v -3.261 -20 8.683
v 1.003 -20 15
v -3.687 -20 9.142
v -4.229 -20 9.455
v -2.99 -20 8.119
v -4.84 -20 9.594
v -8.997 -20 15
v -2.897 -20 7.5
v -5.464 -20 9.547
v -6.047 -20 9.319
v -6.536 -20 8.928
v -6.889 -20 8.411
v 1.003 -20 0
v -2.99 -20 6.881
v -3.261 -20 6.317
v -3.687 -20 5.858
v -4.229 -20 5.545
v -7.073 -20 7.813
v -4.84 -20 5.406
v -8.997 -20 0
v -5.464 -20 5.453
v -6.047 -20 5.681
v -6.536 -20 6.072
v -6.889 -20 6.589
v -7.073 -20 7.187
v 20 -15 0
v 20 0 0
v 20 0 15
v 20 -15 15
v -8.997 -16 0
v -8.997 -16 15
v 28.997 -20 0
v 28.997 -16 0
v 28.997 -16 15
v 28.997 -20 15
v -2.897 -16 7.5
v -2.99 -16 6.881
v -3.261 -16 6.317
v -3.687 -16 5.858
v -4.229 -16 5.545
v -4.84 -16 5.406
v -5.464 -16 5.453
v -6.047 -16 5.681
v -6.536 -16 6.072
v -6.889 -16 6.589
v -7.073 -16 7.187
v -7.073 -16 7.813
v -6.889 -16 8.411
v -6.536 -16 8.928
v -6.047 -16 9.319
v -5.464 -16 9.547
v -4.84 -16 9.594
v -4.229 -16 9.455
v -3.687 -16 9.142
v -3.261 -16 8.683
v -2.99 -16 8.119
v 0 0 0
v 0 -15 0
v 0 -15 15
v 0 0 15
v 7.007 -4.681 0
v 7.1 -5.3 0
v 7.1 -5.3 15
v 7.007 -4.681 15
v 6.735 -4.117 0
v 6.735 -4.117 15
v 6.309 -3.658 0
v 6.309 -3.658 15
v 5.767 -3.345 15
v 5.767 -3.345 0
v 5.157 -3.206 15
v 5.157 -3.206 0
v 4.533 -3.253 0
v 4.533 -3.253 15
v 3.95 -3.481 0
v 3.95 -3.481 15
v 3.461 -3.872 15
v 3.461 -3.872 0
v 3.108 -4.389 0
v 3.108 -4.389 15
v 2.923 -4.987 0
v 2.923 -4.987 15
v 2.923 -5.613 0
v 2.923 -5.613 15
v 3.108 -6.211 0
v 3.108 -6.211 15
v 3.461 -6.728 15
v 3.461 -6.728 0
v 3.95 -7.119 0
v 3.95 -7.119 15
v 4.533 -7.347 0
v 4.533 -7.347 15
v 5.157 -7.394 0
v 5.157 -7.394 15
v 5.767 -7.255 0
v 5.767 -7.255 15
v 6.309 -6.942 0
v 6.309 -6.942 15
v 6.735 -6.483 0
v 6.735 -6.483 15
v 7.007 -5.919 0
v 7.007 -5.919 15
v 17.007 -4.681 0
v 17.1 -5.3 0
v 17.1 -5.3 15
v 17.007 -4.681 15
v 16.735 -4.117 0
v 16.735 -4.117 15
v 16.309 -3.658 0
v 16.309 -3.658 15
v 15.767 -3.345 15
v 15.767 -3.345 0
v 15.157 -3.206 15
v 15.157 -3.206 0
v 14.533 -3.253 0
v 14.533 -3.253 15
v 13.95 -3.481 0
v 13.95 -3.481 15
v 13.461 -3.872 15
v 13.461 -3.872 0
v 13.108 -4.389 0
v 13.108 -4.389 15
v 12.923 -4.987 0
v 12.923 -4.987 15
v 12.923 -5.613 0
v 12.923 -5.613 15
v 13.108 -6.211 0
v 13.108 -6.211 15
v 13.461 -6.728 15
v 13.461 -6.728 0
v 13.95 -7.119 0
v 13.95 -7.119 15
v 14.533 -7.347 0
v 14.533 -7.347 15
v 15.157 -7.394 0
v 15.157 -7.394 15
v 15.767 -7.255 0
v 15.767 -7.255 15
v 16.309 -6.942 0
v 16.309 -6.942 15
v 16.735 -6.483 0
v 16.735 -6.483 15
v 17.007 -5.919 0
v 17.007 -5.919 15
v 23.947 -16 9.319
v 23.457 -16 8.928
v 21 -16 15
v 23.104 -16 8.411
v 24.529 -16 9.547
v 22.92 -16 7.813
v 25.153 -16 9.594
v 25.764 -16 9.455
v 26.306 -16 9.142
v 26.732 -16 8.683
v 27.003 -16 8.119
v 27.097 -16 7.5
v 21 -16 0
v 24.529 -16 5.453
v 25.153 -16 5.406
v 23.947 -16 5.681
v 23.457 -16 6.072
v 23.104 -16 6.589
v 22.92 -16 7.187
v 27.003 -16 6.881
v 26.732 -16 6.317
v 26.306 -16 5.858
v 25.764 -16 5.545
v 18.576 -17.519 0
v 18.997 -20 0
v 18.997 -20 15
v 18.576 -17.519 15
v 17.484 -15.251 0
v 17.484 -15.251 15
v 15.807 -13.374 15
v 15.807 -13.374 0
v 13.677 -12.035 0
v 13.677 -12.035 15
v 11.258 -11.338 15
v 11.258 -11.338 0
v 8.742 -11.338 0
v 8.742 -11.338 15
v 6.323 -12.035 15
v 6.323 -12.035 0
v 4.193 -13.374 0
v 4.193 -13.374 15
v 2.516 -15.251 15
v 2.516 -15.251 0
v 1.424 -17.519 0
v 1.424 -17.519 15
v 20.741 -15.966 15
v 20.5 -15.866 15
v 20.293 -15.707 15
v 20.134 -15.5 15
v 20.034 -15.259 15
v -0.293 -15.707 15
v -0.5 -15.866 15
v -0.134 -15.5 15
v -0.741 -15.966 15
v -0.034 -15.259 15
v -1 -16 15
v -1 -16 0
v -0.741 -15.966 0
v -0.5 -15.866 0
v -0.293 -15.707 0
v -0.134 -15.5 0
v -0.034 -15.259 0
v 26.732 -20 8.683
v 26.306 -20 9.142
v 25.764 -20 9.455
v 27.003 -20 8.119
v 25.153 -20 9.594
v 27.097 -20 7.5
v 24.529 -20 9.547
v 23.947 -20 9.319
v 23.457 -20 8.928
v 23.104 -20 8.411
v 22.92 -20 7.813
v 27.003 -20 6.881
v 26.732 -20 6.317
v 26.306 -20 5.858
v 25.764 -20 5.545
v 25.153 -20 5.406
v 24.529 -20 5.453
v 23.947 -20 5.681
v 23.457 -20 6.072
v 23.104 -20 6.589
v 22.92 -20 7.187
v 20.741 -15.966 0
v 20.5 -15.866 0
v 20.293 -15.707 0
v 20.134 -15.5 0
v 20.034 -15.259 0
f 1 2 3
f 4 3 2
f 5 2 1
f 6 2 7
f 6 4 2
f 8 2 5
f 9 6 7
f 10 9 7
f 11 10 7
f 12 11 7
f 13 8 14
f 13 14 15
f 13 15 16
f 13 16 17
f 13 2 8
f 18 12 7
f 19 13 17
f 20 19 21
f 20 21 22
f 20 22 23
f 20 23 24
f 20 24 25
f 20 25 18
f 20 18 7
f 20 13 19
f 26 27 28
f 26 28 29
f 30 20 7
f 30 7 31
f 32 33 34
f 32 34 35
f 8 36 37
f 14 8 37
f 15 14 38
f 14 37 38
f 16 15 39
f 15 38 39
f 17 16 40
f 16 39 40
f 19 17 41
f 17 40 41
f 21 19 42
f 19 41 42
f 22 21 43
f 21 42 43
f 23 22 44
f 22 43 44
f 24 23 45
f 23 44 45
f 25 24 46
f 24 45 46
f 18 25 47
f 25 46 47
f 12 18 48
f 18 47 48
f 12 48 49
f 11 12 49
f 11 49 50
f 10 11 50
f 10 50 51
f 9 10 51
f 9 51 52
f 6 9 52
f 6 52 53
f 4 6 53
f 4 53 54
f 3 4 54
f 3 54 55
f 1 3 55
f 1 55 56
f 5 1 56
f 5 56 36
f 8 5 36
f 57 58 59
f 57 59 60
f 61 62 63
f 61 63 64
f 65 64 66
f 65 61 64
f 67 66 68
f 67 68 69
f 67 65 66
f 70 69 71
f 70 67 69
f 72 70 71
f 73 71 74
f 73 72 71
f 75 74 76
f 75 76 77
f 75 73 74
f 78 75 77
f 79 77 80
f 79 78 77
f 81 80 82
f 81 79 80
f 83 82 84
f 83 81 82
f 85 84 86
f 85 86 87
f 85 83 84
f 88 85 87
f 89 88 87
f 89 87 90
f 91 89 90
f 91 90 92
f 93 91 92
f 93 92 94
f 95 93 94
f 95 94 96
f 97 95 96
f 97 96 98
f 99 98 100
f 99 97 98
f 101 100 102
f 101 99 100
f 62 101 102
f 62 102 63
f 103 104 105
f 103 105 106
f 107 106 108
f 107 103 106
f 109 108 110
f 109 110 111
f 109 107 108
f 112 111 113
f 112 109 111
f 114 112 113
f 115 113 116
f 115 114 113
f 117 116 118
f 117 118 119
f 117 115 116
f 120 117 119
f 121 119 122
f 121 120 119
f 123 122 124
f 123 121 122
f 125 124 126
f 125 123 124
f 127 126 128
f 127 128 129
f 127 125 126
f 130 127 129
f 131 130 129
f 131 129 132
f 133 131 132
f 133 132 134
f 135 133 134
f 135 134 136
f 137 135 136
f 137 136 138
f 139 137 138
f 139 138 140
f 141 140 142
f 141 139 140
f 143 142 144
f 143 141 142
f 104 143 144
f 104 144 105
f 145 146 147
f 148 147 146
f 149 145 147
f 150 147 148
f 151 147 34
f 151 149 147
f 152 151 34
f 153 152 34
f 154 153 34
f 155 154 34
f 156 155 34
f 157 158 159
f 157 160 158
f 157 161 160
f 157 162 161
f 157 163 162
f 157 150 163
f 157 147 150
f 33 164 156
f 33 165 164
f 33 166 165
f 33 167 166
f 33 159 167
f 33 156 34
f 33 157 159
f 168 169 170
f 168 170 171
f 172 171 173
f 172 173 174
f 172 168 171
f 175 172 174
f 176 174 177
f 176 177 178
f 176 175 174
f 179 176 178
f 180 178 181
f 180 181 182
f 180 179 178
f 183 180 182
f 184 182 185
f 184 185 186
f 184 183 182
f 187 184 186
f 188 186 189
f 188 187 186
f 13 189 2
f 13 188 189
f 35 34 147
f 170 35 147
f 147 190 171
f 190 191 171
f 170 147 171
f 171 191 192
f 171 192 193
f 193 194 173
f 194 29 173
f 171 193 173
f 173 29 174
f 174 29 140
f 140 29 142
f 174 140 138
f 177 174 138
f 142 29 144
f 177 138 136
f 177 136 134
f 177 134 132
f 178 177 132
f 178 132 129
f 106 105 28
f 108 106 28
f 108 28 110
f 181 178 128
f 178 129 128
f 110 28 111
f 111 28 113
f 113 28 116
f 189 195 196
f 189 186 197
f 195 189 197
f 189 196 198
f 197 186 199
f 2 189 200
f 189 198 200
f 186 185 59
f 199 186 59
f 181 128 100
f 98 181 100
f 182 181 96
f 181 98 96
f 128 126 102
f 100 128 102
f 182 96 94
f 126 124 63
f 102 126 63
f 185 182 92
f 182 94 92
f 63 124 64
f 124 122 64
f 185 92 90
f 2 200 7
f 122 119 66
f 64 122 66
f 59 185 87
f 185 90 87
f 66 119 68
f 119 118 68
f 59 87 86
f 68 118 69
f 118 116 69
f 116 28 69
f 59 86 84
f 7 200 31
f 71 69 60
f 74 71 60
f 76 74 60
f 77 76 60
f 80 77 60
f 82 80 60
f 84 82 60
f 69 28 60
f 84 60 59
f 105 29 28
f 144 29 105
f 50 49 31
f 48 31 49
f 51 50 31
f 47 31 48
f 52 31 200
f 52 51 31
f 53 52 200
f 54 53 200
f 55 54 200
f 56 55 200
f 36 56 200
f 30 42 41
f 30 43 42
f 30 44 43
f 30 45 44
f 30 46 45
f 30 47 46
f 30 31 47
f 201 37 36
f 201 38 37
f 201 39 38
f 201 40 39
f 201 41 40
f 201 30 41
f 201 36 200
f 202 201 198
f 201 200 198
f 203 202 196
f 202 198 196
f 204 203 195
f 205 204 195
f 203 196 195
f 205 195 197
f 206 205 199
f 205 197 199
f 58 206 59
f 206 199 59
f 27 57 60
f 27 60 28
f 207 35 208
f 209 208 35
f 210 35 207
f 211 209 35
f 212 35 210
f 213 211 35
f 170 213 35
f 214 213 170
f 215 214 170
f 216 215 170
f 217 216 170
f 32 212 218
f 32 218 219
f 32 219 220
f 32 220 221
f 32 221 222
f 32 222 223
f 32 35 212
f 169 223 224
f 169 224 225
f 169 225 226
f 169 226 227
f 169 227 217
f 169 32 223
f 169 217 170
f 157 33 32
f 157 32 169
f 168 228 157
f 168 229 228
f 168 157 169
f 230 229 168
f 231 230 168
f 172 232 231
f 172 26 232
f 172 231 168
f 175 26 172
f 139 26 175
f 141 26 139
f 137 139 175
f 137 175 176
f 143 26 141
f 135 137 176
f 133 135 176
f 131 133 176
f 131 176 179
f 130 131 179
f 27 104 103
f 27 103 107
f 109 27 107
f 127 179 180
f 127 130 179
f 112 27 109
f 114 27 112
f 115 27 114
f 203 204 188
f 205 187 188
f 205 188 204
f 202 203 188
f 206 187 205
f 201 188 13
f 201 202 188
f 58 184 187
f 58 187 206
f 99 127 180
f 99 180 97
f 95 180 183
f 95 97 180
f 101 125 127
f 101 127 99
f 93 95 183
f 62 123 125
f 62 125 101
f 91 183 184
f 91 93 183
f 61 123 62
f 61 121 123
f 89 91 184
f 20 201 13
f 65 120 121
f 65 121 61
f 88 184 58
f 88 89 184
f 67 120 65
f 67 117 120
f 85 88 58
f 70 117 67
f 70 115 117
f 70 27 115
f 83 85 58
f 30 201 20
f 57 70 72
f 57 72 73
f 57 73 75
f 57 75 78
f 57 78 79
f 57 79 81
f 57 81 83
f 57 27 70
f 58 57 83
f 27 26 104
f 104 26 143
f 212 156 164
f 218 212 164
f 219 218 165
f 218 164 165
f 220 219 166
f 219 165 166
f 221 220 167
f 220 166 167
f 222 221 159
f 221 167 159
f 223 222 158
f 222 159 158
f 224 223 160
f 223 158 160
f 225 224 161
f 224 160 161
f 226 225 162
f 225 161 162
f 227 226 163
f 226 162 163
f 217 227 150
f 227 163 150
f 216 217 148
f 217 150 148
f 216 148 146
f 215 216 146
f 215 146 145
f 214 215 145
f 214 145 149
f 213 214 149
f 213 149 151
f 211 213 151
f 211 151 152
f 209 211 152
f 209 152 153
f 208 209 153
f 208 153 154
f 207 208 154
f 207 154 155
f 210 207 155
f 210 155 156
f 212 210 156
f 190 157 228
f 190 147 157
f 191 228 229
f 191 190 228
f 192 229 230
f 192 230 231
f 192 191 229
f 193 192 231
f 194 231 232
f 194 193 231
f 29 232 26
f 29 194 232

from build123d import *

# Parameters (mm, degrees)
SKETCH1_R           = 2.1
BOSS_EXTRUDE1_DEPTH = 15
SKETCH2_R           = 2.1
CUT_EXTRUDE1_DEPTH  = 10
FILLET2_R           = 1


with BuildPart() as part:
    # Sketch1 → Boss-Extrude1 (new body)
    with BuildSketch(Plane.XY):
        with BuildLine():
            ThreePointArc((18.996527108, -20), (10, -11.25), (1.003472892, -20))
            Line((1.003472892, -20), (-8.996527108, -20))
            Line((-8.996527108, -20), (-8.996527108, -16))
            Line((-8.996527108, -16), (0, -16))
            Line((0, -16), (0, 0))
            Line((0, 0), (20, 0))
            Line((20, 0), (20, -16))
            Line((20, -16), (28.996527108, -16))
            Line((28.996527108, -16), (28.996527108, -20))
            Line((28.996527108, -20), (18.996527108, -20))
        make_face()
        with Locations((15, -5.3)):
            Circle(SKETCH1_R, mode=Mode.SUBTRACT)
        with Locations((5, -5.3)):
            Circle(SKETCH1_R, mode=Mode.SUBTRACT)
    extrude(amount=BOSS_EXTRUDE1_DEPTH)

    # Sketch2 → Cut-Extrude1 (cut)
    with BuildSketch(Plane(origin=(0, -16, 0), x_dir=(1, 0, 0), z_dir=(0, 1, 0))):
        with Locations((-4.996527108, -7.5)):
            Circle(SKETCH2_R)
        with Locations((24.996527108, -7.5)):
            Circle(SKETCH2_R)
    extrude(amount=-CUT_EXTRUDE1_DEPTH, mode=Mode.SUBTRACT)

    # Fillet2
    fillet2_edges = [part.edges().sort_by_distance(p)[0] for p in [
        (0, -16, 7.5),
        (20, -16, 7.5),
    ]]
    fillet(fillet2_edges, radius=FILLET2_R)


solid = part.part
